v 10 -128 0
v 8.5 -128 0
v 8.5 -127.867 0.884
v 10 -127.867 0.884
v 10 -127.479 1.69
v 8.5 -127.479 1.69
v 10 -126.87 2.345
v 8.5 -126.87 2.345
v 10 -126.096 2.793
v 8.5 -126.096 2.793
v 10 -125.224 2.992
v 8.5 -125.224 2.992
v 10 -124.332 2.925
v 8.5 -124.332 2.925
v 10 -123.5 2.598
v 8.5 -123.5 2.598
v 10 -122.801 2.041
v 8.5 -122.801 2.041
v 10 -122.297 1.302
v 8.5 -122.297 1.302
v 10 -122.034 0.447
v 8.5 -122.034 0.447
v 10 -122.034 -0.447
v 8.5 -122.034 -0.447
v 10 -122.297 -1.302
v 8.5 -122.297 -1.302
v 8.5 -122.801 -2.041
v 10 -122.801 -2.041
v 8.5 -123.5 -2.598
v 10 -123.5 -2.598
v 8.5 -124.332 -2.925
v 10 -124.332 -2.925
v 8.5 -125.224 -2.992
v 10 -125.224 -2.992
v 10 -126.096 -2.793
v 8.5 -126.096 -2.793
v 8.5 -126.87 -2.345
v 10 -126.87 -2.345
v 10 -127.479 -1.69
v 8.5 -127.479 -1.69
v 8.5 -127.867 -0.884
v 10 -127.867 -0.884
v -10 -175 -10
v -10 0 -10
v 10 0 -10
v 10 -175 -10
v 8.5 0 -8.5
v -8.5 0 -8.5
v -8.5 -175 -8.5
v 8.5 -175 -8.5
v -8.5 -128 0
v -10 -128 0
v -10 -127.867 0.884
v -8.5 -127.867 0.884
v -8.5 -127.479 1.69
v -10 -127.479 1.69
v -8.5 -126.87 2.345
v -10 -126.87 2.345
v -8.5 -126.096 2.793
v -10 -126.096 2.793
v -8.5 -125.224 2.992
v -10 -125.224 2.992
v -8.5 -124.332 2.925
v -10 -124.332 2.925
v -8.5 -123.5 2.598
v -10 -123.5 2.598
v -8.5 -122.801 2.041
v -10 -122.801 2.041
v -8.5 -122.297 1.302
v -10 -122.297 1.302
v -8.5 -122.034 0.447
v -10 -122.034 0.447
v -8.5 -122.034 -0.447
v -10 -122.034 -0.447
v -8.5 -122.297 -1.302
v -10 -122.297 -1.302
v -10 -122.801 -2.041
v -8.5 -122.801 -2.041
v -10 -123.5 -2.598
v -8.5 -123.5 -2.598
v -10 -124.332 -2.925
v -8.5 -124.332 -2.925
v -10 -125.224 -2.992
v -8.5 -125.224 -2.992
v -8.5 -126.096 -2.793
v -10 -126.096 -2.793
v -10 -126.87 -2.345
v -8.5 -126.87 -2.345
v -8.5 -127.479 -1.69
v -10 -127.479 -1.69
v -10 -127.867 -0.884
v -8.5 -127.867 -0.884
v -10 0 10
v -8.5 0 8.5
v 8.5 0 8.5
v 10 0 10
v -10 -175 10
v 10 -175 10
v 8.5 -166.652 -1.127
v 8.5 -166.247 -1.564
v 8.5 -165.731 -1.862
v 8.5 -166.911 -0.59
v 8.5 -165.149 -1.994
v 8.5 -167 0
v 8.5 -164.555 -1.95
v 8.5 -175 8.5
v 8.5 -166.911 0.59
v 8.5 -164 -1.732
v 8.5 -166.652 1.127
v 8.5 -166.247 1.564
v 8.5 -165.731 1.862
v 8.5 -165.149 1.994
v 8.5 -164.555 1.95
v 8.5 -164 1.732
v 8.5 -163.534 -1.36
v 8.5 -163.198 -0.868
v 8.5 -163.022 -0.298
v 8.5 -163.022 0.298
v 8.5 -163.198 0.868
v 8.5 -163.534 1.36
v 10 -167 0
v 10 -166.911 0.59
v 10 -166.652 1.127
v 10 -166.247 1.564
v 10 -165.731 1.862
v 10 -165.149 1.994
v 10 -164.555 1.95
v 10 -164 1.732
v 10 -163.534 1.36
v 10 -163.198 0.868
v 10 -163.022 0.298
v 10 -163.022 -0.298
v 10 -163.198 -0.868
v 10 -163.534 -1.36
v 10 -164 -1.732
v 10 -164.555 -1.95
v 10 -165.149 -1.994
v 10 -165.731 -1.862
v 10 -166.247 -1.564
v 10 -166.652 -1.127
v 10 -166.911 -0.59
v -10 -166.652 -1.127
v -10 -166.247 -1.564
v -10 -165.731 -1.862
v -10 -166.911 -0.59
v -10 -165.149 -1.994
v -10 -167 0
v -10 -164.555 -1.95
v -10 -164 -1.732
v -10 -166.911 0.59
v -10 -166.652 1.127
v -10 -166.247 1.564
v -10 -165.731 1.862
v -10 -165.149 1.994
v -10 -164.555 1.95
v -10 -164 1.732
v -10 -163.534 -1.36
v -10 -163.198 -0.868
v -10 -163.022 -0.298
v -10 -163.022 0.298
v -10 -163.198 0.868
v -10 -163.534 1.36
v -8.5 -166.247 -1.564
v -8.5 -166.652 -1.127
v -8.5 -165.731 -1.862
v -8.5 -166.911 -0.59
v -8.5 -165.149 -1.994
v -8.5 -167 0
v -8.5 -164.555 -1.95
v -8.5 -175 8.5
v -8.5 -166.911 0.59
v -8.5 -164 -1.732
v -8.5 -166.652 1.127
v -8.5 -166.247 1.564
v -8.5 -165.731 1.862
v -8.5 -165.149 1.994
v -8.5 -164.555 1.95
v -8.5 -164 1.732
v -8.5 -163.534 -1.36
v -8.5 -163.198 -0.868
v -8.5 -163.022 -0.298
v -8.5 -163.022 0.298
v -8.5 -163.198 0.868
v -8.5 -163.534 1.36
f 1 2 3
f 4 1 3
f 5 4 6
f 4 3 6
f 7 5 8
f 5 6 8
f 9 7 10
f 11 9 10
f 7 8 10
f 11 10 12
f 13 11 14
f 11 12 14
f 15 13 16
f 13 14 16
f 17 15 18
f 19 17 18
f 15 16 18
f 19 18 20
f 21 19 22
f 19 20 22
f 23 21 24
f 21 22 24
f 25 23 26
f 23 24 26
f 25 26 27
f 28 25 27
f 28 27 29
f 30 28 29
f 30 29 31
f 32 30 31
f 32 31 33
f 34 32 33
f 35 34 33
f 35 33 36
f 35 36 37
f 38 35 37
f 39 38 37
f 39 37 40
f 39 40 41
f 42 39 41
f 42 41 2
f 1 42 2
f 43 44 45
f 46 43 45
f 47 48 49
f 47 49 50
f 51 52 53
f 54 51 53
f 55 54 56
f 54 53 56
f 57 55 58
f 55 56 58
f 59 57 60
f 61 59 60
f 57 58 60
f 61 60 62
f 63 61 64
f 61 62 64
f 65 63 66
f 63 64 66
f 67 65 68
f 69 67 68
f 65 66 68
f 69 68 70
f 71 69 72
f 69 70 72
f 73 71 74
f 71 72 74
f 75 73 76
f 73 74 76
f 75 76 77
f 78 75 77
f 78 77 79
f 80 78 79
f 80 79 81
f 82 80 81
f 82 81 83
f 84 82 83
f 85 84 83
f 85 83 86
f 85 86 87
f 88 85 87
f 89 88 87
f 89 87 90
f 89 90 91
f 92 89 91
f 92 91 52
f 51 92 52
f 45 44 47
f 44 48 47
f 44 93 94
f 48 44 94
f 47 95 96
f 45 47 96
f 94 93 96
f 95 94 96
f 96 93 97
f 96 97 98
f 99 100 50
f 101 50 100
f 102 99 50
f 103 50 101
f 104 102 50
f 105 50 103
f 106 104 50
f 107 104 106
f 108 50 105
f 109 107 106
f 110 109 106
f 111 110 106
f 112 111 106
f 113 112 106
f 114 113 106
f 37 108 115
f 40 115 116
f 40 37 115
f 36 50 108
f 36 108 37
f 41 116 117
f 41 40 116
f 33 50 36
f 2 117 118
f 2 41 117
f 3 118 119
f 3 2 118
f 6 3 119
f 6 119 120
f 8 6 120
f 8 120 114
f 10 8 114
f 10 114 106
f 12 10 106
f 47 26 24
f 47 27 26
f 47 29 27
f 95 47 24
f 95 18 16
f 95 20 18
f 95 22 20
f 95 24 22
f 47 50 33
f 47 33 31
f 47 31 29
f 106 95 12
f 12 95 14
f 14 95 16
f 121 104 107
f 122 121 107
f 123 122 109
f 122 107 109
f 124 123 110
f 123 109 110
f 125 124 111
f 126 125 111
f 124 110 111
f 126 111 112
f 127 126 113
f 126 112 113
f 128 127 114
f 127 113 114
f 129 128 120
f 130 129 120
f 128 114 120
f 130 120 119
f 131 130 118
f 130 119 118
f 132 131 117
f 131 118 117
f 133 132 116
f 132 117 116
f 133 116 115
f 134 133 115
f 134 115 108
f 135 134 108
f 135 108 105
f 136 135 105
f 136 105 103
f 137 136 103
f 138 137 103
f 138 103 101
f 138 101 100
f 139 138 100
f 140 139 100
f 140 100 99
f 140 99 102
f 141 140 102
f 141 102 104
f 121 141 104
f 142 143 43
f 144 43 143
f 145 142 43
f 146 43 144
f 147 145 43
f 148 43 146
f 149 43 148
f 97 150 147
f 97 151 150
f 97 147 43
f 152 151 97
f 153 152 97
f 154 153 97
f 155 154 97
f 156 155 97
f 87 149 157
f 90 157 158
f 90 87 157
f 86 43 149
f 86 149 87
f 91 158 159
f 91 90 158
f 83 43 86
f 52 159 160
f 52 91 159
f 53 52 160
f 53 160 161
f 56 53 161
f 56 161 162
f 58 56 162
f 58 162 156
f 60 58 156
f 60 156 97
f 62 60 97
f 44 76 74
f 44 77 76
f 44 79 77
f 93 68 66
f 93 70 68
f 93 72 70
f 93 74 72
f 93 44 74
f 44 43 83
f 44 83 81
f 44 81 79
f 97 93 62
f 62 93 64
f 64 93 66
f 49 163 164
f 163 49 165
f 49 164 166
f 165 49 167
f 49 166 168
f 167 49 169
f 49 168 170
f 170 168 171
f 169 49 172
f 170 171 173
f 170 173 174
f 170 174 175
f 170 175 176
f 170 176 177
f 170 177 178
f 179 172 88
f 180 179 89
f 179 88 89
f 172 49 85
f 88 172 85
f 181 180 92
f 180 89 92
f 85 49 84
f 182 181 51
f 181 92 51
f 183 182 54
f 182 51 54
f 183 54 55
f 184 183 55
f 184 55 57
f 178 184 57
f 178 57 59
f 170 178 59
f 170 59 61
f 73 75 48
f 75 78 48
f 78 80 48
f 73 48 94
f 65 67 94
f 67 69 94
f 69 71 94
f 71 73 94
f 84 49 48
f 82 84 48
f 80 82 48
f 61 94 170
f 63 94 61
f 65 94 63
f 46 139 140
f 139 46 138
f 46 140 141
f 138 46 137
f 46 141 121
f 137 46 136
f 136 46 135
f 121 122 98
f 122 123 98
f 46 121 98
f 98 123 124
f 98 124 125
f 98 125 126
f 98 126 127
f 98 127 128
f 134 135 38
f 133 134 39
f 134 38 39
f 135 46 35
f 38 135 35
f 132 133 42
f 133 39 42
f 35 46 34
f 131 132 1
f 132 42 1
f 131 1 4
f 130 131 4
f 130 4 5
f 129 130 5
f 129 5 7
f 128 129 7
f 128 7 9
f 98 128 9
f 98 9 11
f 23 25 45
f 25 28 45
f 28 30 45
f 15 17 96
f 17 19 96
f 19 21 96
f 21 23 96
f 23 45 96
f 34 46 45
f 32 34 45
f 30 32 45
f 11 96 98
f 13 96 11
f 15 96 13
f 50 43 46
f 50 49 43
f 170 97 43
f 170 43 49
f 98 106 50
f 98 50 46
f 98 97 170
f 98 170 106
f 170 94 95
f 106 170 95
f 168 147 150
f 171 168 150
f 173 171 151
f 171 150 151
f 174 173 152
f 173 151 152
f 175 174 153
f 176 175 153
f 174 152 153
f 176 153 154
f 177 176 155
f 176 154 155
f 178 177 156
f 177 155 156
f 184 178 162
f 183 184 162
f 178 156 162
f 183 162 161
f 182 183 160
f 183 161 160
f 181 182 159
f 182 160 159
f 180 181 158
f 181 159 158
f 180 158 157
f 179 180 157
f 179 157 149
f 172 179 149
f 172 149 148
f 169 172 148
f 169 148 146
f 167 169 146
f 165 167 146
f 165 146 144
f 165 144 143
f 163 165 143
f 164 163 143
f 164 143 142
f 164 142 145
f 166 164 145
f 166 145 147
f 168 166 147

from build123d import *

# Parameters (mm, degrees)
F0_W     = 20
F0_H     = 20
F0_W_2   = 17
F0_H_2   = 17
F1_DEPTH = 175
F3_D     = 4
F5_D     = 6


with BuildPart() as f1:
    # F0 (on Front) → F1 (new body)
    with BuildSketch(Plane.XZ):
        Rectangle(F0_W, F0_H)
        Rectangle(F0_W_2, F0_H_2, mode=Mode.SUBTRACT)
    extrude(amount=F1_DEPTH)

    # F3 (through all)
    with Locations(Plane.YZ.offset(10)):
        with Locations((-165, 0)):
            Hole(F3_D / 2)

    # F5 (through all)
    with Locations(Plane.YZ.offset(10)):
        with Locations((-125, 0)):
            Hole(F5_D / 2)


solid = f1.part
